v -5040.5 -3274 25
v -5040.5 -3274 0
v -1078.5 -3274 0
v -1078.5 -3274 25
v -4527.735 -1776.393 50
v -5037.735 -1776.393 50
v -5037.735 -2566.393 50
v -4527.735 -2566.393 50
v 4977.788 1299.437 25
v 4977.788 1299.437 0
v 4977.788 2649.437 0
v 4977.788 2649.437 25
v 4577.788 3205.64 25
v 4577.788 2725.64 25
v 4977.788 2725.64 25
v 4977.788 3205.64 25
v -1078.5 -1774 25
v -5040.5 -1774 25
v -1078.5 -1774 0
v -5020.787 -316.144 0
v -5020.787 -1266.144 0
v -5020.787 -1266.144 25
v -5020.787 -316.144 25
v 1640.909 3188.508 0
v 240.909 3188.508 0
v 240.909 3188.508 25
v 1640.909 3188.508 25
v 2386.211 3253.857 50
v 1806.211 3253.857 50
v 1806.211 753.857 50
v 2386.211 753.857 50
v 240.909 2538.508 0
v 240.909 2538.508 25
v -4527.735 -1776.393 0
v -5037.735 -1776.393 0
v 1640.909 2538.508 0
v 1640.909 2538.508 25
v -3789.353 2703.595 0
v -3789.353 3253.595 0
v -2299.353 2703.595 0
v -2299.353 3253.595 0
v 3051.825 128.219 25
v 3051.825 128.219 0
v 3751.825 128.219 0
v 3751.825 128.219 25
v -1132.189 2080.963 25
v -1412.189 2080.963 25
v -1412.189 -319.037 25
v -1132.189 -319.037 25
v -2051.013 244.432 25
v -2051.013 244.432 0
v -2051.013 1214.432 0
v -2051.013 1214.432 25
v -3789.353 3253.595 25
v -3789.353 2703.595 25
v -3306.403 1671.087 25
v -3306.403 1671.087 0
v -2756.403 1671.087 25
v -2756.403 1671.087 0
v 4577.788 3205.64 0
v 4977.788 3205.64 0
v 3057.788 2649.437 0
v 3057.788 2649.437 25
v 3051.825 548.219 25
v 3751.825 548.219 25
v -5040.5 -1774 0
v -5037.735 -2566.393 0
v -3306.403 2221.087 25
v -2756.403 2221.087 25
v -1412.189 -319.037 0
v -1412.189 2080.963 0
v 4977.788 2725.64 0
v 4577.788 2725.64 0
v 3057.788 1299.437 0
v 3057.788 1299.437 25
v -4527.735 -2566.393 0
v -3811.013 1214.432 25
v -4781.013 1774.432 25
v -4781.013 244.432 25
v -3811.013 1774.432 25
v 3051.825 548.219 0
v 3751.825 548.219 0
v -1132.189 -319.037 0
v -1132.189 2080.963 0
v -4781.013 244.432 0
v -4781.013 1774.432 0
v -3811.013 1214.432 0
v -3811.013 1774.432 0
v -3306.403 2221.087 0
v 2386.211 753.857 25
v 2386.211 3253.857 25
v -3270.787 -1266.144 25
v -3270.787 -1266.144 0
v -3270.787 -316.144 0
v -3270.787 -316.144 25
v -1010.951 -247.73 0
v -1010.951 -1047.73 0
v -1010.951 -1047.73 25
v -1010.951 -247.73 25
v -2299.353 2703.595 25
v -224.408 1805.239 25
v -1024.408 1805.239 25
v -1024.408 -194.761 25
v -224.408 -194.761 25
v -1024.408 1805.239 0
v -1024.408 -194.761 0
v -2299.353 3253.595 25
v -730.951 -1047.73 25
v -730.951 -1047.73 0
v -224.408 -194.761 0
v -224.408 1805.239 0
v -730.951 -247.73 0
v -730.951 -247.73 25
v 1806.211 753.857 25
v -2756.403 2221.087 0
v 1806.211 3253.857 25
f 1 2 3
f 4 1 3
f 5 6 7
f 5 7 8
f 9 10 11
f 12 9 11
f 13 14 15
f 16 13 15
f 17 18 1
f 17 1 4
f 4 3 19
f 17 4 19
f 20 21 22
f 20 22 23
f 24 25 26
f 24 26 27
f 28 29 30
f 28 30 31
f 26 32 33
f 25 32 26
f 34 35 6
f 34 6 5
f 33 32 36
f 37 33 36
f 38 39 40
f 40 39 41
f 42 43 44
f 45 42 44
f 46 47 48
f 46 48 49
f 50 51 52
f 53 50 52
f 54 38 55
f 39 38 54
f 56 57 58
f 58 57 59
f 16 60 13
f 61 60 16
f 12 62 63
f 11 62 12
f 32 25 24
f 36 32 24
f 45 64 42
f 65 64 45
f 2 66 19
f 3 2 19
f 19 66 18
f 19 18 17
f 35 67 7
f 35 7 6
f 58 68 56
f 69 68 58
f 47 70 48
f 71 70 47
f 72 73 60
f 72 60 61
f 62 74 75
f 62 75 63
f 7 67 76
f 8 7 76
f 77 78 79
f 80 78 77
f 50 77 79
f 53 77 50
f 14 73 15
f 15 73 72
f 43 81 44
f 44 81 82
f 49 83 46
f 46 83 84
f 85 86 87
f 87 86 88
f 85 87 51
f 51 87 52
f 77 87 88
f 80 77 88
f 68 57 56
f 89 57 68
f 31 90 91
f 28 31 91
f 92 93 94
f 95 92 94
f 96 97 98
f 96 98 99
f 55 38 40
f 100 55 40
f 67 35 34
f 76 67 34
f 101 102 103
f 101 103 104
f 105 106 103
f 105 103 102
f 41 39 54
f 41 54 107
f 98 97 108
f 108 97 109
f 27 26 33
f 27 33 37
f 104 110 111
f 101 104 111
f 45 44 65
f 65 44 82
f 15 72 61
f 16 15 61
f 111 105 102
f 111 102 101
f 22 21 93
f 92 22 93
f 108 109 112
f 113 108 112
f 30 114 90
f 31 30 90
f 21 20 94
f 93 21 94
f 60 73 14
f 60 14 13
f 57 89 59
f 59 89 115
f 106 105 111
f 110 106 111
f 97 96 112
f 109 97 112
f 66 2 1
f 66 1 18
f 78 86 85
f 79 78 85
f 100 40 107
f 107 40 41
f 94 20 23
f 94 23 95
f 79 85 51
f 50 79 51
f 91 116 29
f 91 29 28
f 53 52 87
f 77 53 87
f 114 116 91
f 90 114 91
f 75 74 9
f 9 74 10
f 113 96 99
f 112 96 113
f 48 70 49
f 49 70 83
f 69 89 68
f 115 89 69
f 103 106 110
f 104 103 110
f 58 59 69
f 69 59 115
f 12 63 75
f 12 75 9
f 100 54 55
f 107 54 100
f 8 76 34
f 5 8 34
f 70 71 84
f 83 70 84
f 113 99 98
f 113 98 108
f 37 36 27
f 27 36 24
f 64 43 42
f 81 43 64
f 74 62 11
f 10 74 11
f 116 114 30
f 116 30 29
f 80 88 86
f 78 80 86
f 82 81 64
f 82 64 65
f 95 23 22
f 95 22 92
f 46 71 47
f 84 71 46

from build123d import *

# Parameters (mm, degrees)
F2_W      = 1920
F2_H      = 1350
F3_DEPTH  = 25
F4_W      = 580
F4_H      = 2500
F5_DEPTH  = 25
F6_W      = 700
F6_H      = 420
F7_DEPTH  = 25
F8_W      = 800
F8_H      = 2000
F9_DEPTH  = 25
F10_W     = 3962
F10_H     = 1500
F11_DEPTH = 25
F13_DEPTH = 25
F14_W     = 1750
F14_H     = 950
F15_DEPTH = 25
F16_W     = 400
F16_H     = 480
F17_DEPTH = 25
F18_W     = 1400
F18_H     = 650
F19_DEPTH = 25
F20_W     = 280
F20_H     = 2400
F21_DEPTH = 25
F22_W     = 1490
F22_H     = 550
F23_DEPTH = 25
F24_W     = 550
F24_H     = 550
F25_DEPTH = 25
F26_W     = 280
F26_H     = 800
F27_DEPTH = 25
F28_W     = 510
F28_H     = 790
F29_DEPTH = 50


with BuildPart() as f3:
    # F2 (on face) → F3 (new body)
    with BuildSketch(Plane.XY):
        with Locations((4017.787971, 1974.437165)):
            Rectangle(F2_W, F2_H)
    extrude(amount=F3_DEPTH)


with BuildPart() as f5:
    # F4 (on face) → F5 (new body)
    with BuildSketch(Plane.XY.offset(25)):
        with Locations((2096.21068, 2003.856629)):
            Rectangle(F4_W, F4_H)
    extrude(amount=F5_DEPTH)


with BuildPart() as f7:
    # F6 (on face) → F7 (new body)
    with BuildSketch(Plane.XY):
        with Locations((3401.82457, 338.219351)):
            Rectangle(F6_W, F6_H)
    extrude(amount=F7_DEPTH)


with BuildPart() as f9:
    # F8 (on face) → F9 (new body)
    with BuildSketch(Plane.XY):
        with Locations((-624.407864, 805.238724)):
            Rectangle(F8_W, F8_H)
    extrude(amount=F9_DEPTH)


with BuildPart() as f11:
    # F10 (on face) → F11 (new body)
    with BuildSketch(Plane.XY):
        with Locations((-3059.5, -2524)):
            Rectangle(F10_W, F10_H)
    extrude(amount=F11_DEPTH)


with BuildPart() as f13:
    # F12 (on face) → F13 (new body)
    with BuildSketch(Plane.XY):
        Polygon((-3811.013489, 1774.43166), (-4781.013489, 1774.43166), (-4781.013489, 244.43166), (-2051.013489, 244.43166), (-2051.013489, 1214.43166), (-3811.013489, 1214.43166), align=None)
    extrude(amount=F13_DEPTH)


with BuildPart() as f15:
    # F14 (on face) → F15 (new body)
    with BuildSketch(Plane.XY):
        with Locations((-4145.787239, -791.144395)):
            Rectangle(F14_W, F14_H)
    extrude(amount=F15_DEPTH)


with BuildPart() as f17:
    # F16 (on face) → F17 (new body)
    with BuildSketch(Plane.XY):
        with Locations((4777.787971, 2965.640316)):
            Rectangle(F16_W, F16_H)
    extrude(amount=F17_DEPTH)


with BuildPart() as f19:
    # F18 (on face) → F19 (new body)
    with BuildSketch(Plane.XY):
        with Locations((940.908957, 2863.508034)):
            Rectangle(F18_W, F18_H)
    extrude(amount=F19_DEPTH)


with BuildPart() as f21:
    # F20 (on face) → F21 (new body)
    with BuildSketch(Plane.XY):
        with Locations((-1272.188768, 880.962801)):
            Rectangle(F20_W, F20_H)
    extrude(amount=F21_DEPTH)


with BuildPart() as f23:
    # F22 (on face) → F23 (new body)
    with BuildSketch(Plane.XY):
        with Locations((-3044.352646, 2978.595114)):
            Rectangle(F22_W, F22_H)
    extrude(amount=F23_DEPTH)


with BuildPart() as f25:
    # F24 (on face) → F25 (new body)
    with BuildSketch(Plane.XY):
        with Locations((-3031.403399, 1946.086907)):
            Rectangle(F24_W, F24_H)
    extrude(amount=F25_DEPTH)


with BuildPart() as f27:
    # F26 (on face) → F27 (new body)
    with BuildSketch(Plane.XY):
        with Locations((-870.951042, -647.729731)):
            Rectangle(F26_W, F26_H)
    extrude(amount=F27_DEPTH)


with BuildPart() as f29:
    # F28 (on face) → F29 (new body)
    with BuildSketch(Plane.XY):
        with Locations((-4782.735462, -2171.393375)):
            Rectangle(F28_W, F28_H)
    extrude(amount=F29_DEPTH)


solid = Compound([f3.part, f5.part, f7.part, f9.part, f11.part, f13.part, f15.part, f17.part, f19.part, f21.part, f23.part, f25.part, f27.part, f29.part])
